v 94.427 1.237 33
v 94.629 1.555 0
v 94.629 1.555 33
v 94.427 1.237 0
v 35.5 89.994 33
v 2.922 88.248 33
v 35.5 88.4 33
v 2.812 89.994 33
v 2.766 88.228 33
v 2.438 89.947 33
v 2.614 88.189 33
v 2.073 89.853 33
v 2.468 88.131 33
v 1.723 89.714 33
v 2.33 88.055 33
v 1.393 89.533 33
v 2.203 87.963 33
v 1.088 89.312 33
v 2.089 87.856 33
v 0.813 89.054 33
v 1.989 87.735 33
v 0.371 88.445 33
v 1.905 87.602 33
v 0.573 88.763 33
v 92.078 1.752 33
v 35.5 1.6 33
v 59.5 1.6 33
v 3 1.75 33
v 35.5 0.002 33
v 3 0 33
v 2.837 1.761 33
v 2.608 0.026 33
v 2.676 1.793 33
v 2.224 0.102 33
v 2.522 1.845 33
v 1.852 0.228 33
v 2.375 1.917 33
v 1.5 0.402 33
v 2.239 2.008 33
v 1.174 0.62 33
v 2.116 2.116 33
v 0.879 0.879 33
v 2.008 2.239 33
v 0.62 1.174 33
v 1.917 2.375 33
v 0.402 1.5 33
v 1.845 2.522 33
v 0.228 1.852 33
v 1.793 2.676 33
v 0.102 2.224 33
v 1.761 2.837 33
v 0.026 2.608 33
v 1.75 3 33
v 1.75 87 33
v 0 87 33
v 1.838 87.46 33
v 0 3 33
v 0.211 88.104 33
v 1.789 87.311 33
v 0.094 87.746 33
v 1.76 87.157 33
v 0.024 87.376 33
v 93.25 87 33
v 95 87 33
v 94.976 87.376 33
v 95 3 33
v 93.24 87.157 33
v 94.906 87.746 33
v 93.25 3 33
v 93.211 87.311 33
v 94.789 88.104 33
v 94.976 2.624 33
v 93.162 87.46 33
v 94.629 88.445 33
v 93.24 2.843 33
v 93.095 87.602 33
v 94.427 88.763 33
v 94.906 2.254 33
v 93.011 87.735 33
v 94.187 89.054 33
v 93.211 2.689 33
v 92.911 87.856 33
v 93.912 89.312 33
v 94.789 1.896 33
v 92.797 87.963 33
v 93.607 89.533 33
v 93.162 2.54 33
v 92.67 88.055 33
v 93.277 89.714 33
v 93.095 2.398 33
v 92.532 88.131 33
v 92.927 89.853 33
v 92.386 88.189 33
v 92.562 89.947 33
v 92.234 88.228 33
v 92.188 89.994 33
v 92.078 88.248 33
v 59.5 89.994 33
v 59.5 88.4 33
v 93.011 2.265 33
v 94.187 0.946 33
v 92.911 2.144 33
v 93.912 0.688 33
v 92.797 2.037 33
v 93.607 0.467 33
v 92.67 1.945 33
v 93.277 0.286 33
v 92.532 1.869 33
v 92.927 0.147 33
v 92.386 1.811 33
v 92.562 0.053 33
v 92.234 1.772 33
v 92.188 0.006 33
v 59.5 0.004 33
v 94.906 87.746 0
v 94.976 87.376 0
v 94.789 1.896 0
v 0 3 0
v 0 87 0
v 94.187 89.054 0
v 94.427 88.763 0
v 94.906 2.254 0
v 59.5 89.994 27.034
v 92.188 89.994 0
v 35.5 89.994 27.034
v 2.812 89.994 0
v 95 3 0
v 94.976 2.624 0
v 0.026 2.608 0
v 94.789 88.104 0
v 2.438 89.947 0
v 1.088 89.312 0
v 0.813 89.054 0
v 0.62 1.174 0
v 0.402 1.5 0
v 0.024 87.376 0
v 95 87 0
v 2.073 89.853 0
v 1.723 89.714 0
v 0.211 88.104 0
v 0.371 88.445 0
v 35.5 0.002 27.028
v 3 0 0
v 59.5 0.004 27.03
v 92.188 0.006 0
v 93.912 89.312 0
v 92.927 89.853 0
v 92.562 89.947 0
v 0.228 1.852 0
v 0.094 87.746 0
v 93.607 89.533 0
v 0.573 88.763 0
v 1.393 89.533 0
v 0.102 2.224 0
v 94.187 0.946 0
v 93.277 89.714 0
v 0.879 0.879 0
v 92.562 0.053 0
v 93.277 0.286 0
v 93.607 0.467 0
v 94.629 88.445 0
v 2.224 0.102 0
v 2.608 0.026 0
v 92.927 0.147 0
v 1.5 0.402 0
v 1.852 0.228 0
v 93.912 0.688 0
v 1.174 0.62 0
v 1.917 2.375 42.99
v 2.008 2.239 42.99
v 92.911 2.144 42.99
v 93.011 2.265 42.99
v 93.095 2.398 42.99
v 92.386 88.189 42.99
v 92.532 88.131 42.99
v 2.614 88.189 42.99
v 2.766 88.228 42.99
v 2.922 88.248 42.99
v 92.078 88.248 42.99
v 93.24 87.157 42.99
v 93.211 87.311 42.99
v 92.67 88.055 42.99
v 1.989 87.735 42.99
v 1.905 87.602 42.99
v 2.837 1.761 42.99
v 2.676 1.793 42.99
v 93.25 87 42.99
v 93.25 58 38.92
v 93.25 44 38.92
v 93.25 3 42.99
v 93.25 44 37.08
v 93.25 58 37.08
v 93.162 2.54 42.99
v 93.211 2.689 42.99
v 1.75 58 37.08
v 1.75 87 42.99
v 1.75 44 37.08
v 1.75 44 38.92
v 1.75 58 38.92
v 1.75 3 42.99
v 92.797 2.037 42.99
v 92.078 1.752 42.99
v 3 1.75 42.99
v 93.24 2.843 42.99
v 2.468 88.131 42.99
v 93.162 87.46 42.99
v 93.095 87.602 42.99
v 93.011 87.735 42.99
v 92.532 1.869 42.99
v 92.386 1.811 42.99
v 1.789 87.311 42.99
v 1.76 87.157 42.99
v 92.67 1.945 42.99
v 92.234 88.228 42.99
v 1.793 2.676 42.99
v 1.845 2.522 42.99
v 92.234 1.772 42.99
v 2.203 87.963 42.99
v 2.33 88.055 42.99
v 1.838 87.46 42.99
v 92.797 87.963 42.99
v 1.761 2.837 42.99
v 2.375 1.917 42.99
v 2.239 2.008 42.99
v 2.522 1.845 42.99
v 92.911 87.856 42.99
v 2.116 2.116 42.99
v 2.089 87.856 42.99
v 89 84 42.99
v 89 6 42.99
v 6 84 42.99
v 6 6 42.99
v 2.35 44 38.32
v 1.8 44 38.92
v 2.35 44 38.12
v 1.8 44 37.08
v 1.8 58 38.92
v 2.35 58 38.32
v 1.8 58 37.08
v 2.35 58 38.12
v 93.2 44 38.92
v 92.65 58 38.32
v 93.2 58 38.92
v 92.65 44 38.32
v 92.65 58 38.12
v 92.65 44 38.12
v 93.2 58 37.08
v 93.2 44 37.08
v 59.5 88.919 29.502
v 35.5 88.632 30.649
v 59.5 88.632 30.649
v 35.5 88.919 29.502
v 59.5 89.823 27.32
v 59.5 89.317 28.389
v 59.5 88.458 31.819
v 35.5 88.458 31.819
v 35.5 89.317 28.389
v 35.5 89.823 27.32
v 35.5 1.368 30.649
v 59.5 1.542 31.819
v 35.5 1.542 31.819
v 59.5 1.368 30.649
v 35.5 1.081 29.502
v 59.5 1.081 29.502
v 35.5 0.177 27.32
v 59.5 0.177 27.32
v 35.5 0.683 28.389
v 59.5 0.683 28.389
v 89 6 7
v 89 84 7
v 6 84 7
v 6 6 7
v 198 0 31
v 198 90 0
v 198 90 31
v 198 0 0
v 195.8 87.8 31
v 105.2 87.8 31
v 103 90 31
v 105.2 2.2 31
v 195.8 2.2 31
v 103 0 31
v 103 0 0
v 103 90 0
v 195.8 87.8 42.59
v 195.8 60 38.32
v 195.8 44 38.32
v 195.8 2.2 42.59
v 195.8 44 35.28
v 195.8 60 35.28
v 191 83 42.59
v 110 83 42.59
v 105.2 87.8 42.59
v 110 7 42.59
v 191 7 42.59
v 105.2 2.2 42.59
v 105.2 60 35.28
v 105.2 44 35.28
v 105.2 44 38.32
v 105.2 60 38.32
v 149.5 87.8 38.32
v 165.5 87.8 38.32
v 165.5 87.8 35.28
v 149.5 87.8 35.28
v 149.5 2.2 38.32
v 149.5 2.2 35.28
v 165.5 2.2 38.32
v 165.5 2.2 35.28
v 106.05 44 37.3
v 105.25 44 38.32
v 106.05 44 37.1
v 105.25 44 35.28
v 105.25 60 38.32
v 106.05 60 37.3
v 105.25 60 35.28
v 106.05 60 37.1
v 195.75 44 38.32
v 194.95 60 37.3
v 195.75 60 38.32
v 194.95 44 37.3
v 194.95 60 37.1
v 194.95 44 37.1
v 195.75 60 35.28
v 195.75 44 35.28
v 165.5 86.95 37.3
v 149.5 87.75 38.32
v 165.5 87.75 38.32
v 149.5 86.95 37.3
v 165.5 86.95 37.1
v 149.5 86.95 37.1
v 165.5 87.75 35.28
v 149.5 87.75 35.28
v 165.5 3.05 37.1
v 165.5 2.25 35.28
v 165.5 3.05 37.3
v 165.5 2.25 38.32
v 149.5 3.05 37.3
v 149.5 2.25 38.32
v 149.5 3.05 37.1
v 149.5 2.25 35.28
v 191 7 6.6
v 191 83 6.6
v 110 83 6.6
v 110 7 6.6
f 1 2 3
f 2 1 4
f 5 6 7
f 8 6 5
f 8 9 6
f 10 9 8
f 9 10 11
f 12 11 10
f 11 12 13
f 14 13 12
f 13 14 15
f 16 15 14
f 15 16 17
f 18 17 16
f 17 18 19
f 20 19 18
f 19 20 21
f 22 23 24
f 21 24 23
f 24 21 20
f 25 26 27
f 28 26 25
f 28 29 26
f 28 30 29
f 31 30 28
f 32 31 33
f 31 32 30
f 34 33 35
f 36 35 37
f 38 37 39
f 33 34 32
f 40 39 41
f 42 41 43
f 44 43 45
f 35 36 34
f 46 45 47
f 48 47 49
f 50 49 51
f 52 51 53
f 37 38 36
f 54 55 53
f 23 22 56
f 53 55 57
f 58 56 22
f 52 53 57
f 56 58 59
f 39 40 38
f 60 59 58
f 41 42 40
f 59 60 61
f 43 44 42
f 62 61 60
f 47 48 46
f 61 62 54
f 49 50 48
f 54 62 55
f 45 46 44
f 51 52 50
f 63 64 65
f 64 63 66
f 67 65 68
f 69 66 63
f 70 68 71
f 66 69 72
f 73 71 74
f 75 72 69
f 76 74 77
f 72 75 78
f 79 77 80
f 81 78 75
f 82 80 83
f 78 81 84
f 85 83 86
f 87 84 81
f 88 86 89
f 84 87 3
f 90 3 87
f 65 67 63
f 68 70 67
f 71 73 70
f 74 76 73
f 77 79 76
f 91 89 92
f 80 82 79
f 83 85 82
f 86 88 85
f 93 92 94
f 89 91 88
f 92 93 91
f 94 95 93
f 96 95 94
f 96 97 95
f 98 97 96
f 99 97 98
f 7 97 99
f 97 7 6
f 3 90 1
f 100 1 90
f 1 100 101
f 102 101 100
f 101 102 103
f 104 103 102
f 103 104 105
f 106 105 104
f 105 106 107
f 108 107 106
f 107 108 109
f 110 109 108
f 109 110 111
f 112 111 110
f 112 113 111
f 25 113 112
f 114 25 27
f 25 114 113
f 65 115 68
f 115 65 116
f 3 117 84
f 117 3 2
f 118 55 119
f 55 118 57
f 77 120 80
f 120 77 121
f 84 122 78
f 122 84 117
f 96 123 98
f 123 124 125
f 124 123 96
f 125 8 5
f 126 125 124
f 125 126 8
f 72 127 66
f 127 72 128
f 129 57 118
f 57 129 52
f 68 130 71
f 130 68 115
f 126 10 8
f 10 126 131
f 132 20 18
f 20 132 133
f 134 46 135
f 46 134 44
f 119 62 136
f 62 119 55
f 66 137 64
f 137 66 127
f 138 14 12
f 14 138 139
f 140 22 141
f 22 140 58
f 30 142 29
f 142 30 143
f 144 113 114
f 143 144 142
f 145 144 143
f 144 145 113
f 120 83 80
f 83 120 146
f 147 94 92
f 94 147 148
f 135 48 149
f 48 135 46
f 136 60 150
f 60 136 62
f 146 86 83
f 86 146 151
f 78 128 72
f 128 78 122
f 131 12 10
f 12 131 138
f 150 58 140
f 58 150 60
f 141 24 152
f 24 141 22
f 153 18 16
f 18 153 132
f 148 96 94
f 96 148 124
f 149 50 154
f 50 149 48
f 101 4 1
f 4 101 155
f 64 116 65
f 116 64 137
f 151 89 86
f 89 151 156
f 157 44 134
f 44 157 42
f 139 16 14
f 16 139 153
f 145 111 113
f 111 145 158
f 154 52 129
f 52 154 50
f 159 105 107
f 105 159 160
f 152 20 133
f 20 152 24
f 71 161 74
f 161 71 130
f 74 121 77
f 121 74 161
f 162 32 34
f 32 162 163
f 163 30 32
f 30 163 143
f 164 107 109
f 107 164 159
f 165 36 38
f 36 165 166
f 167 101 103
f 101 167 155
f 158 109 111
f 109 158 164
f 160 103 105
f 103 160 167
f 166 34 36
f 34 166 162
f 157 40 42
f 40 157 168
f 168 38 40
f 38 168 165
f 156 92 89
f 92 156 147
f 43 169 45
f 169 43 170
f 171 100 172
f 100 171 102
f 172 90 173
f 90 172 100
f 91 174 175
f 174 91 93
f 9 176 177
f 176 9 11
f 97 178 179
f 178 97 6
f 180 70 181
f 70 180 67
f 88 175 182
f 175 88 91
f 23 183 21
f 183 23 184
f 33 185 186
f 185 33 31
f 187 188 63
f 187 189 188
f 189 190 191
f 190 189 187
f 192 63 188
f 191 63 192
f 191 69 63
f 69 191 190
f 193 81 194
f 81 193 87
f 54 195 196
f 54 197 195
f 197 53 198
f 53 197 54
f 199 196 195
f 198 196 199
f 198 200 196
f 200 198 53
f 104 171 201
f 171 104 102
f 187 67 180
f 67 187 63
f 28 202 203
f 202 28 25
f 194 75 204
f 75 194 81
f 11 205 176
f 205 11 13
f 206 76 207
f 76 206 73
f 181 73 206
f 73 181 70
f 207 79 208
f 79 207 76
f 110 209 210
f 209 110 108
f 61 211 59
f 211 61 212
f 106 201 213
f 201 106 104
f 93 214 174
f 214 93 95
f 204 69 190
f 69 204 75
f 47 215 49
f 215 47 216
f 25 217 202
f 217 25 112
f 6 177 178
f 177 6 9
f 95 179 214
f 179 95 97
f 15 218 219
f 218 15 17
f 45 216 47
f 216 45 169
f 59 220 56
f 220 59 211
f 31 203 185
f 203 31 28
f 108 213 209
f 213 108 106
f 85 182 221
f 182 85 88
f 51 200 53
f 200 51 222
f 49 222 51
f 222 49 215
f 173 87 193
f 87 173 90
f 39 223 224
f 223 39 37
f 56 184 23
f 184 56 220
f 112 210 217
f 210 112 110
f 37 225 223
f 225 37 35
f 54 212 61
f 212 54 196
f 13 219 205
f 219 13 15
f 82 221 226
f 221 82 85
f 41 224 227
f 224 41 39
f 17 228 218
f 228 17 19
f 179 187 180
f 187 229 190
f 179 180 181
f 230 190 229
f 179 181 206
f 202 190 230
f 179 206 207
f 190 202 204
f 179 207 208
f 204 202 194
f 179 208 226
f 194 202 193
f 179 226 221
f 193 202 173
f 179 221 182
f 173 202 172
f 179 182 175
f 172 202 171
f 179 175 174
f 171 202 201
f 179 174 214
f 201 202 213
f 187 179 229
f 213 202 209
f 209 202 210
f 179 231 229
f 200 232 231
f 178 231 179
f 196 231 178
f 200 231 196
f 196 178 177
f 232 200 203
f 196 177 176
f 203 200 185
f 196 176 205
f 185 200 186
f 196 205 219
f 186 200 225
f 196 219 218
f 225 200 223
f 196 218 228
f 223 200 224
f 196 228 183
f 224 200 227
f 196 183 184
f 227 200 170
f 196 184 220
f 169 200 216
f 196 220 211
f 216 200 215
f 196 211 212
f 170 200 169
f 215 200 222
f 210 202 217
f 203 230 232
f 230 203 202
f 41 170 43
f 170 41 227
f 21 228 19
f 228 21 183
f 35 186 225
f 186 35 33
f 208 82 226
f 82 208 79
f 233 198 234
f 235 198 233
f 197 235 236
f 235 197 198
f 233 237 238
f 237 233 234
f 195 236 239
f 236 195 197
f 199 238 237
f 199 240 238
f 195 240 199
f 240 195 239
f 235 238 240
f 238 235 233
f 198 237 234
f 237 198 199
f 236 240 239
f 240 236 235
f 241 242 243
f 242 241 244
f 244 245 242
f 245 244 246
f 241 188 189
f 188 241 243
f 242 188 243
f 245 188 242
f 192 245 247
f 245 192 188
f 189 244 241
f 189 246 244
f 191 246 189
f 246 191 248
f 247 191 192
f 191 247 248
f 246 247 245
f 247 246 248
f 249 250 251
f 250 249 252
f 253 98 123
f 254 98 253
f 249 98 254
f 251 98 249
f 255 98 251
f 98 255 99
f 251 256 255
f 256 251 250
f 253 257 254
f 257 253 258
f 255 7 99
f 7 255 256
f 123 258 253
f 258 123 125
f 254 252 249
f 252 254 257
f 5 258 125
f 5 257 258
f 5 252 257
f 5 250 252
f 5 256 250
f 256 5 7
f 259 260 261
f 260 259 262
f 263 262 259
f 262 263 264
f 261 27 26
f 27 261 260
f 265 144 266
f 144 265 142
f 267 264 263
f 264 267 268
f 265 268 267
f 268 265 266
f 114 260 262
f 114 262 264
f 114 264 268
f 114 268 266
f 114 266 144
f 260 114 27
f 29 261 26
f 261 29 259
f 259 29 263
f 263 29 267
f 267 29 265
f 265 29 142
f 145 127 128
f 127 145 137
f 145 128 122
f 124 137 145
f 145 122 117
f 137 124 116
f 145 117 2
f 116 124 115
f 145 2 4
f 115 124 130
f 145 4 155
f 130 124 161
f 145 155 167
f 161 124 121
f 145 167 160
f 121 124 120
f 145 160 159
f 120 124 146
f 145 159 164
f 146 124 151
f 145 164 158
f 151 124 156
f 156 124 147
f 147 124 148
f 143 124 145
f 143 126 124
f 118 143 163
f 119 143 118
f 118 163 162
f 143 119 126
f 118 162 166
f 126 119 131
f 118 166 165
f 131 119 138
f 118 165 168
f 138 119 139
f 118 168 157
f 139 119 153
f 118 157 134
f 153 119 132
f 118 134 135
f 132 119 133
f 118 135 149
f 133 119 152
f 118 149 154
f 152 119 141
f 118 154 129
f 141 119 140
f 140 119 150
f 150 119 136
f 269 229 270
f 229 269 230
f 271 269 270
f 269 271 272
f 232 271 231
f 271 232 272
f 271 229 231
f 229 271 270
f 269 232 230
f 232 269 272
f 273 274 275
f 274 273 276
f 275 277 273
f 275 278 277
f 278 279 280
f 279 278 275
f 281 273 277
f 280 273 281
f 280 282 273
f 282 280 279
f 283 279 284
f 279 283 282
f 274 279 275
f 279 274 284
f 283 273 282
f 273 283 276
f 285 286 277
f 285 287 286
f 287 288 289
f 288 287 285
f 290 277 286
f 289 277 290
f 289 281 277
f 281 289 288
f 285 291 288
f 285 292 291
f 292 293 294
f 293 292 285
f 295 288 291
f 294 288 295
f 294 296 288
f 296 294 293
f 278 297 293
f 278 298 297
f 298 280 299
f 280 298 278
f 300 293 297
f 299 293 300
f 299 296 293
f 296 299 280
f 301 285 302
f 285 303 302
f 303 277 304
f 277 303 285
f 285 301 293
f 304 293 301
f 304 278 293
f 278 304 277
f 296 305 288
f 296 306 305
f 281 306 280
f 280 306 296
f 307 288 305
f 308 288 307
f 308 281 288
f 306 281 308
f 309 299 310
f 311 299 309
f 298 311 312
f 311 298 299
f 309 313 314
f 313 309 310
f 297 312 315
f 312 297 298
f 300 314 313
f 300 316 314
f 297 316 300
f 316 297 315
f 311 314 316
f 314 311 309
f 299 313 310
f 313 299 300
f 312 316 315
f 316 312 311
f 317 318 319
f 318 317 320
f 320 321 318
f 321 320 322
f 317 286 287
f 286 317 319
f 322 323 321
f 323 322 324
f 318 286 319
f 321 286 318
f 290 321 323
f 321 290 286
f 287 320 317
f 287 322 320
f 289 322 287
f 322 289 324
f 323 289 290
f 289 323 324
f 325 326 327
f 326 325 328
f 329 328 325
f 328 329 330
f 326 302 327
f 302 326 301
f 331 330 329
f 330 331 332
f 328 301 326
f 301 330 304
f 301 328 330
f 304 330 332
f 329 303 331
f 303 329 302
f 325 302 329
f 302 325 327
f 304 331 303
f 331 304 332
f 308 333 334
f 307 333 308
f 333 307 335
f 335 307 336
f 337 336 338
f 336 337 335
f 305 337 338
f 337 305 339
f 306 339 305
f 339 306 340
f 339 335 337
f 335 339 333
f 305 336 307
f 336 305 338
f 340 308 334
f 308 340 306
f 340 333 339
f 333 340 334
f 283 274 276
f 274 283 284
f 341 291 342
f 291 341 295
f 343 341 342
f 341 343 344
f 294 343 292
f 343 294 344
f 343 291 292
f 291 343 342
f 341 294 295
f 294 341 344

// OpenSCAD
$fn=48;
translate([0,0,0])
{
difference()
{
    translate(v = [3.00, 3.00, 0.00])
    {
        hull()
        {
            cylinder(center = false, r1 = 3, r2 = 3, h = 45);
            translate(v = [89.00, 0.00, 0.00])
            {
                cylinder(center = false, r1 = 3, r2 = 3, h = 45, $fn = 50);
            }
            translate(v = [0.00, 84.00, 0.00])
            {
                cylinder(center = false, r1 = 3, r2 = 3, h = 45, $fn = 50);
            }
            translate(v = [89.00, 84.00, 0.00])
            {
                cylinder(center = false, r1 = 3, r2 = 3, h = 45, $fn = 50);
            }
        }
    }
    translate(v = [0.00, 0.00, 33.00])
    {
        union()
        {
            union()
            {
                difference()
                {
                    translate(v = [3.00, 3.00, 0.00])
                    {
                        hull()
                        {
                            cylinder(center = false, r1 = 3, r2 = 3, h = 12);
                            translate(v = [89.00, 0.00, 0.00])
                            {
                                cylinder(center = false, r1 = 3, r2 = 3, h = 12, $fn = 50);
                            }
                            translate(v = [0.00, 84.00, 0.00])
                            {
                                cylinder(center = false, r1 = 3, r2 = 3, h = 12, $fn = 50);
                            }
                            translate(v = [89.00, 84.00, 0.00])
                            {
                                cylinder(center = false, r1 = 3, r2 = 3, h = 12, $fn = 50);
                            }
                        }
                    }
                    translate(v = [1.75, 1.75, -0.01])
                    {
                        translate(v = [1.25, 1.25, 0.00])
                        {
                            hull()
                            {
                                cylinder(center = false, r1 = 1.25, r2 = 1.25, h = 10);
                                translate(v = [89.00, 0.00, 0.00])
                                {
                                    cylinder(center = false, r1 = 1.25, r2 = 1.25, h = 10, $fn = 50);
                                }
                                translate(v = [0.00, 84.00, 0.00])
                                {
                                    cylinder(center = false, r1 = 1.25, r2 = 1.25, h = 10, $fn = 50);
                                }
                                translate(v = [89.00, 84.00, 0.00])
                                {
                                    cylinder(center = false, r1 = 1.25, r2 = 1.25, h = 10, $fn = 50);
                                }
                            }
                        }
                    }
                }
                translate(v = [1.75, 58.00, 0.00])
                {
                    rotate([90.00, 0.00, 0.00])
                    {
                        hull()
                        {
                            translate(v = [0.00, 4.08, 0.00])
                            {
                                cube(size = [0.05, 1.84, 14.00], center = false); 
                            }
                            translate(v = [0.55, 5.12, 0.00])
                            {
                                cube(size = [0.05, 0.20, 14.00], center = false); 
                            }
                        }
                    }
                }
                translate(v = [93.25, 44.00, 0.00])
                {
                    rotate([90.00, 0.00, 180.00])
                    {
                        hull()
                        {
                            translate(v = [0.00, 4.08, 0.00])
                            {
                                cube(size = [0.05, 1.84, 14.00], center = false); 
                            }
                            translate(v = [0.55, 5.12, 0.00])
                            {
                                cube(size = [0.05, 0.20, 14.00], center = false); 
                            }
                        }
                    }
                }
            }
            translate(v = [59.50, 90.00, 0.00])
            {
                rotate([90.00, 0.00, -90.00])
                {
                    translate(v = [-10.45, 0.00, 0.00])
                    {
                        cylinder(center = false, r1 = 12.05, r2 = 12.05, h = 24, $fn = 64);
                    }
                }
            }
            translate(v = [35.50, 0.00, 0.00])
            {
                rotate([90.00, 0.00, 90.00])
                {
                    translate(v = [-10.45, 0.00, 0.00])
                    {
                        cylinder(center = false, r1 = 12.05, r2 = 12.05, h = 24, $fn = 64);
                    }
                }
            }
        }
    }
    translate(v = [6.00, 6.00, 7.00])
    {
        cube(size = [83.00, 78.00, 36.00], center = false); 
    }
}

}
translate([103,0,0])
{
difference()
{
    cube(size = [95.00, 90.00, 45.00], center = false); 
    translate(v = [0.00, 0.00, 31.00])
    {
        union()
        {
            difference()
            {
                cube(size = [95.00, 90.00, 14.00], center = false); 
                translate(v = [2.20, 2.20, -0.01])
                {
                    cube(size = [90.60, 85.60, 11.60], center = false); 
                }
            }
            translate(v = [2.20, 60.00, 0.00])
            {
                rotate([90.00, 0.00, 0.00])
                {
                    hull()
                    {
                        translate(v = [0.00, 4.28, 0.00])
                        {
                            cube(size = [0.05, 3.04, 16.00], center = false); 
                        }
                        translate(v = [0.80, 6.10, 0.00])
                        {
                            cube(size = [0.05, 0.20, 16.00], center = false); 
                        }
                    }
                }
            }
            translate(v = [92.80, 44.00, 0.00])
            {
                rotate([90.00, 0.00, 180.00])
                {
                    hull()
                    {
                        translate(v = [0.00, 4.28, 0.00])
                        {
                            cube(size = [0.05, 3.04, 16.00], center = false); 
                        }
                        translate(v = [0.80, 6.10, 0.00])
                        {
                            cube(size = [0.05, 0.20, 16.00], center = false); 
                        }
                    }
                }
            }
            translate(v = [62.50, 87.80, 0.00])
            {
                rotate([90.00, 0.00, -90.00])
                {
                    hull()
                    {
                        translate(v = [0.00, 4.28, 0.00])
                        {
                            cube(size = [0.05, 3.04, 16.00], center = false); 
                        }
                        translate(v = [0.80, 6.10, 0.00])
                        {
                            cube(size = [0.05, 0.20, 16.00], center = false); 
                        }
                    }
                }
            }
            translate(v = [46.50, 2.20, 0.00])
            {
                rotate([90.00, 0.00, 90.00])
                {
                    hull()
                    {
                        translate(v = [0.00, 4.28, 0.00])
                        {
                            cube(size = [0.05, 3.04, 16.00], center = false); 
                        }
                        translate(v = [0.80, 6.10, 0.00])
                        {
                            cube(size = [0.05, 0.20, 16.00], center = false); 
                        }
                    }
                }
            }
        }
    }
    translate(v = [7.00, 7.00, 6.60])
    {
        cube(size = [81.00, 76.00, 36.00], center = false); 
    }
}

}
